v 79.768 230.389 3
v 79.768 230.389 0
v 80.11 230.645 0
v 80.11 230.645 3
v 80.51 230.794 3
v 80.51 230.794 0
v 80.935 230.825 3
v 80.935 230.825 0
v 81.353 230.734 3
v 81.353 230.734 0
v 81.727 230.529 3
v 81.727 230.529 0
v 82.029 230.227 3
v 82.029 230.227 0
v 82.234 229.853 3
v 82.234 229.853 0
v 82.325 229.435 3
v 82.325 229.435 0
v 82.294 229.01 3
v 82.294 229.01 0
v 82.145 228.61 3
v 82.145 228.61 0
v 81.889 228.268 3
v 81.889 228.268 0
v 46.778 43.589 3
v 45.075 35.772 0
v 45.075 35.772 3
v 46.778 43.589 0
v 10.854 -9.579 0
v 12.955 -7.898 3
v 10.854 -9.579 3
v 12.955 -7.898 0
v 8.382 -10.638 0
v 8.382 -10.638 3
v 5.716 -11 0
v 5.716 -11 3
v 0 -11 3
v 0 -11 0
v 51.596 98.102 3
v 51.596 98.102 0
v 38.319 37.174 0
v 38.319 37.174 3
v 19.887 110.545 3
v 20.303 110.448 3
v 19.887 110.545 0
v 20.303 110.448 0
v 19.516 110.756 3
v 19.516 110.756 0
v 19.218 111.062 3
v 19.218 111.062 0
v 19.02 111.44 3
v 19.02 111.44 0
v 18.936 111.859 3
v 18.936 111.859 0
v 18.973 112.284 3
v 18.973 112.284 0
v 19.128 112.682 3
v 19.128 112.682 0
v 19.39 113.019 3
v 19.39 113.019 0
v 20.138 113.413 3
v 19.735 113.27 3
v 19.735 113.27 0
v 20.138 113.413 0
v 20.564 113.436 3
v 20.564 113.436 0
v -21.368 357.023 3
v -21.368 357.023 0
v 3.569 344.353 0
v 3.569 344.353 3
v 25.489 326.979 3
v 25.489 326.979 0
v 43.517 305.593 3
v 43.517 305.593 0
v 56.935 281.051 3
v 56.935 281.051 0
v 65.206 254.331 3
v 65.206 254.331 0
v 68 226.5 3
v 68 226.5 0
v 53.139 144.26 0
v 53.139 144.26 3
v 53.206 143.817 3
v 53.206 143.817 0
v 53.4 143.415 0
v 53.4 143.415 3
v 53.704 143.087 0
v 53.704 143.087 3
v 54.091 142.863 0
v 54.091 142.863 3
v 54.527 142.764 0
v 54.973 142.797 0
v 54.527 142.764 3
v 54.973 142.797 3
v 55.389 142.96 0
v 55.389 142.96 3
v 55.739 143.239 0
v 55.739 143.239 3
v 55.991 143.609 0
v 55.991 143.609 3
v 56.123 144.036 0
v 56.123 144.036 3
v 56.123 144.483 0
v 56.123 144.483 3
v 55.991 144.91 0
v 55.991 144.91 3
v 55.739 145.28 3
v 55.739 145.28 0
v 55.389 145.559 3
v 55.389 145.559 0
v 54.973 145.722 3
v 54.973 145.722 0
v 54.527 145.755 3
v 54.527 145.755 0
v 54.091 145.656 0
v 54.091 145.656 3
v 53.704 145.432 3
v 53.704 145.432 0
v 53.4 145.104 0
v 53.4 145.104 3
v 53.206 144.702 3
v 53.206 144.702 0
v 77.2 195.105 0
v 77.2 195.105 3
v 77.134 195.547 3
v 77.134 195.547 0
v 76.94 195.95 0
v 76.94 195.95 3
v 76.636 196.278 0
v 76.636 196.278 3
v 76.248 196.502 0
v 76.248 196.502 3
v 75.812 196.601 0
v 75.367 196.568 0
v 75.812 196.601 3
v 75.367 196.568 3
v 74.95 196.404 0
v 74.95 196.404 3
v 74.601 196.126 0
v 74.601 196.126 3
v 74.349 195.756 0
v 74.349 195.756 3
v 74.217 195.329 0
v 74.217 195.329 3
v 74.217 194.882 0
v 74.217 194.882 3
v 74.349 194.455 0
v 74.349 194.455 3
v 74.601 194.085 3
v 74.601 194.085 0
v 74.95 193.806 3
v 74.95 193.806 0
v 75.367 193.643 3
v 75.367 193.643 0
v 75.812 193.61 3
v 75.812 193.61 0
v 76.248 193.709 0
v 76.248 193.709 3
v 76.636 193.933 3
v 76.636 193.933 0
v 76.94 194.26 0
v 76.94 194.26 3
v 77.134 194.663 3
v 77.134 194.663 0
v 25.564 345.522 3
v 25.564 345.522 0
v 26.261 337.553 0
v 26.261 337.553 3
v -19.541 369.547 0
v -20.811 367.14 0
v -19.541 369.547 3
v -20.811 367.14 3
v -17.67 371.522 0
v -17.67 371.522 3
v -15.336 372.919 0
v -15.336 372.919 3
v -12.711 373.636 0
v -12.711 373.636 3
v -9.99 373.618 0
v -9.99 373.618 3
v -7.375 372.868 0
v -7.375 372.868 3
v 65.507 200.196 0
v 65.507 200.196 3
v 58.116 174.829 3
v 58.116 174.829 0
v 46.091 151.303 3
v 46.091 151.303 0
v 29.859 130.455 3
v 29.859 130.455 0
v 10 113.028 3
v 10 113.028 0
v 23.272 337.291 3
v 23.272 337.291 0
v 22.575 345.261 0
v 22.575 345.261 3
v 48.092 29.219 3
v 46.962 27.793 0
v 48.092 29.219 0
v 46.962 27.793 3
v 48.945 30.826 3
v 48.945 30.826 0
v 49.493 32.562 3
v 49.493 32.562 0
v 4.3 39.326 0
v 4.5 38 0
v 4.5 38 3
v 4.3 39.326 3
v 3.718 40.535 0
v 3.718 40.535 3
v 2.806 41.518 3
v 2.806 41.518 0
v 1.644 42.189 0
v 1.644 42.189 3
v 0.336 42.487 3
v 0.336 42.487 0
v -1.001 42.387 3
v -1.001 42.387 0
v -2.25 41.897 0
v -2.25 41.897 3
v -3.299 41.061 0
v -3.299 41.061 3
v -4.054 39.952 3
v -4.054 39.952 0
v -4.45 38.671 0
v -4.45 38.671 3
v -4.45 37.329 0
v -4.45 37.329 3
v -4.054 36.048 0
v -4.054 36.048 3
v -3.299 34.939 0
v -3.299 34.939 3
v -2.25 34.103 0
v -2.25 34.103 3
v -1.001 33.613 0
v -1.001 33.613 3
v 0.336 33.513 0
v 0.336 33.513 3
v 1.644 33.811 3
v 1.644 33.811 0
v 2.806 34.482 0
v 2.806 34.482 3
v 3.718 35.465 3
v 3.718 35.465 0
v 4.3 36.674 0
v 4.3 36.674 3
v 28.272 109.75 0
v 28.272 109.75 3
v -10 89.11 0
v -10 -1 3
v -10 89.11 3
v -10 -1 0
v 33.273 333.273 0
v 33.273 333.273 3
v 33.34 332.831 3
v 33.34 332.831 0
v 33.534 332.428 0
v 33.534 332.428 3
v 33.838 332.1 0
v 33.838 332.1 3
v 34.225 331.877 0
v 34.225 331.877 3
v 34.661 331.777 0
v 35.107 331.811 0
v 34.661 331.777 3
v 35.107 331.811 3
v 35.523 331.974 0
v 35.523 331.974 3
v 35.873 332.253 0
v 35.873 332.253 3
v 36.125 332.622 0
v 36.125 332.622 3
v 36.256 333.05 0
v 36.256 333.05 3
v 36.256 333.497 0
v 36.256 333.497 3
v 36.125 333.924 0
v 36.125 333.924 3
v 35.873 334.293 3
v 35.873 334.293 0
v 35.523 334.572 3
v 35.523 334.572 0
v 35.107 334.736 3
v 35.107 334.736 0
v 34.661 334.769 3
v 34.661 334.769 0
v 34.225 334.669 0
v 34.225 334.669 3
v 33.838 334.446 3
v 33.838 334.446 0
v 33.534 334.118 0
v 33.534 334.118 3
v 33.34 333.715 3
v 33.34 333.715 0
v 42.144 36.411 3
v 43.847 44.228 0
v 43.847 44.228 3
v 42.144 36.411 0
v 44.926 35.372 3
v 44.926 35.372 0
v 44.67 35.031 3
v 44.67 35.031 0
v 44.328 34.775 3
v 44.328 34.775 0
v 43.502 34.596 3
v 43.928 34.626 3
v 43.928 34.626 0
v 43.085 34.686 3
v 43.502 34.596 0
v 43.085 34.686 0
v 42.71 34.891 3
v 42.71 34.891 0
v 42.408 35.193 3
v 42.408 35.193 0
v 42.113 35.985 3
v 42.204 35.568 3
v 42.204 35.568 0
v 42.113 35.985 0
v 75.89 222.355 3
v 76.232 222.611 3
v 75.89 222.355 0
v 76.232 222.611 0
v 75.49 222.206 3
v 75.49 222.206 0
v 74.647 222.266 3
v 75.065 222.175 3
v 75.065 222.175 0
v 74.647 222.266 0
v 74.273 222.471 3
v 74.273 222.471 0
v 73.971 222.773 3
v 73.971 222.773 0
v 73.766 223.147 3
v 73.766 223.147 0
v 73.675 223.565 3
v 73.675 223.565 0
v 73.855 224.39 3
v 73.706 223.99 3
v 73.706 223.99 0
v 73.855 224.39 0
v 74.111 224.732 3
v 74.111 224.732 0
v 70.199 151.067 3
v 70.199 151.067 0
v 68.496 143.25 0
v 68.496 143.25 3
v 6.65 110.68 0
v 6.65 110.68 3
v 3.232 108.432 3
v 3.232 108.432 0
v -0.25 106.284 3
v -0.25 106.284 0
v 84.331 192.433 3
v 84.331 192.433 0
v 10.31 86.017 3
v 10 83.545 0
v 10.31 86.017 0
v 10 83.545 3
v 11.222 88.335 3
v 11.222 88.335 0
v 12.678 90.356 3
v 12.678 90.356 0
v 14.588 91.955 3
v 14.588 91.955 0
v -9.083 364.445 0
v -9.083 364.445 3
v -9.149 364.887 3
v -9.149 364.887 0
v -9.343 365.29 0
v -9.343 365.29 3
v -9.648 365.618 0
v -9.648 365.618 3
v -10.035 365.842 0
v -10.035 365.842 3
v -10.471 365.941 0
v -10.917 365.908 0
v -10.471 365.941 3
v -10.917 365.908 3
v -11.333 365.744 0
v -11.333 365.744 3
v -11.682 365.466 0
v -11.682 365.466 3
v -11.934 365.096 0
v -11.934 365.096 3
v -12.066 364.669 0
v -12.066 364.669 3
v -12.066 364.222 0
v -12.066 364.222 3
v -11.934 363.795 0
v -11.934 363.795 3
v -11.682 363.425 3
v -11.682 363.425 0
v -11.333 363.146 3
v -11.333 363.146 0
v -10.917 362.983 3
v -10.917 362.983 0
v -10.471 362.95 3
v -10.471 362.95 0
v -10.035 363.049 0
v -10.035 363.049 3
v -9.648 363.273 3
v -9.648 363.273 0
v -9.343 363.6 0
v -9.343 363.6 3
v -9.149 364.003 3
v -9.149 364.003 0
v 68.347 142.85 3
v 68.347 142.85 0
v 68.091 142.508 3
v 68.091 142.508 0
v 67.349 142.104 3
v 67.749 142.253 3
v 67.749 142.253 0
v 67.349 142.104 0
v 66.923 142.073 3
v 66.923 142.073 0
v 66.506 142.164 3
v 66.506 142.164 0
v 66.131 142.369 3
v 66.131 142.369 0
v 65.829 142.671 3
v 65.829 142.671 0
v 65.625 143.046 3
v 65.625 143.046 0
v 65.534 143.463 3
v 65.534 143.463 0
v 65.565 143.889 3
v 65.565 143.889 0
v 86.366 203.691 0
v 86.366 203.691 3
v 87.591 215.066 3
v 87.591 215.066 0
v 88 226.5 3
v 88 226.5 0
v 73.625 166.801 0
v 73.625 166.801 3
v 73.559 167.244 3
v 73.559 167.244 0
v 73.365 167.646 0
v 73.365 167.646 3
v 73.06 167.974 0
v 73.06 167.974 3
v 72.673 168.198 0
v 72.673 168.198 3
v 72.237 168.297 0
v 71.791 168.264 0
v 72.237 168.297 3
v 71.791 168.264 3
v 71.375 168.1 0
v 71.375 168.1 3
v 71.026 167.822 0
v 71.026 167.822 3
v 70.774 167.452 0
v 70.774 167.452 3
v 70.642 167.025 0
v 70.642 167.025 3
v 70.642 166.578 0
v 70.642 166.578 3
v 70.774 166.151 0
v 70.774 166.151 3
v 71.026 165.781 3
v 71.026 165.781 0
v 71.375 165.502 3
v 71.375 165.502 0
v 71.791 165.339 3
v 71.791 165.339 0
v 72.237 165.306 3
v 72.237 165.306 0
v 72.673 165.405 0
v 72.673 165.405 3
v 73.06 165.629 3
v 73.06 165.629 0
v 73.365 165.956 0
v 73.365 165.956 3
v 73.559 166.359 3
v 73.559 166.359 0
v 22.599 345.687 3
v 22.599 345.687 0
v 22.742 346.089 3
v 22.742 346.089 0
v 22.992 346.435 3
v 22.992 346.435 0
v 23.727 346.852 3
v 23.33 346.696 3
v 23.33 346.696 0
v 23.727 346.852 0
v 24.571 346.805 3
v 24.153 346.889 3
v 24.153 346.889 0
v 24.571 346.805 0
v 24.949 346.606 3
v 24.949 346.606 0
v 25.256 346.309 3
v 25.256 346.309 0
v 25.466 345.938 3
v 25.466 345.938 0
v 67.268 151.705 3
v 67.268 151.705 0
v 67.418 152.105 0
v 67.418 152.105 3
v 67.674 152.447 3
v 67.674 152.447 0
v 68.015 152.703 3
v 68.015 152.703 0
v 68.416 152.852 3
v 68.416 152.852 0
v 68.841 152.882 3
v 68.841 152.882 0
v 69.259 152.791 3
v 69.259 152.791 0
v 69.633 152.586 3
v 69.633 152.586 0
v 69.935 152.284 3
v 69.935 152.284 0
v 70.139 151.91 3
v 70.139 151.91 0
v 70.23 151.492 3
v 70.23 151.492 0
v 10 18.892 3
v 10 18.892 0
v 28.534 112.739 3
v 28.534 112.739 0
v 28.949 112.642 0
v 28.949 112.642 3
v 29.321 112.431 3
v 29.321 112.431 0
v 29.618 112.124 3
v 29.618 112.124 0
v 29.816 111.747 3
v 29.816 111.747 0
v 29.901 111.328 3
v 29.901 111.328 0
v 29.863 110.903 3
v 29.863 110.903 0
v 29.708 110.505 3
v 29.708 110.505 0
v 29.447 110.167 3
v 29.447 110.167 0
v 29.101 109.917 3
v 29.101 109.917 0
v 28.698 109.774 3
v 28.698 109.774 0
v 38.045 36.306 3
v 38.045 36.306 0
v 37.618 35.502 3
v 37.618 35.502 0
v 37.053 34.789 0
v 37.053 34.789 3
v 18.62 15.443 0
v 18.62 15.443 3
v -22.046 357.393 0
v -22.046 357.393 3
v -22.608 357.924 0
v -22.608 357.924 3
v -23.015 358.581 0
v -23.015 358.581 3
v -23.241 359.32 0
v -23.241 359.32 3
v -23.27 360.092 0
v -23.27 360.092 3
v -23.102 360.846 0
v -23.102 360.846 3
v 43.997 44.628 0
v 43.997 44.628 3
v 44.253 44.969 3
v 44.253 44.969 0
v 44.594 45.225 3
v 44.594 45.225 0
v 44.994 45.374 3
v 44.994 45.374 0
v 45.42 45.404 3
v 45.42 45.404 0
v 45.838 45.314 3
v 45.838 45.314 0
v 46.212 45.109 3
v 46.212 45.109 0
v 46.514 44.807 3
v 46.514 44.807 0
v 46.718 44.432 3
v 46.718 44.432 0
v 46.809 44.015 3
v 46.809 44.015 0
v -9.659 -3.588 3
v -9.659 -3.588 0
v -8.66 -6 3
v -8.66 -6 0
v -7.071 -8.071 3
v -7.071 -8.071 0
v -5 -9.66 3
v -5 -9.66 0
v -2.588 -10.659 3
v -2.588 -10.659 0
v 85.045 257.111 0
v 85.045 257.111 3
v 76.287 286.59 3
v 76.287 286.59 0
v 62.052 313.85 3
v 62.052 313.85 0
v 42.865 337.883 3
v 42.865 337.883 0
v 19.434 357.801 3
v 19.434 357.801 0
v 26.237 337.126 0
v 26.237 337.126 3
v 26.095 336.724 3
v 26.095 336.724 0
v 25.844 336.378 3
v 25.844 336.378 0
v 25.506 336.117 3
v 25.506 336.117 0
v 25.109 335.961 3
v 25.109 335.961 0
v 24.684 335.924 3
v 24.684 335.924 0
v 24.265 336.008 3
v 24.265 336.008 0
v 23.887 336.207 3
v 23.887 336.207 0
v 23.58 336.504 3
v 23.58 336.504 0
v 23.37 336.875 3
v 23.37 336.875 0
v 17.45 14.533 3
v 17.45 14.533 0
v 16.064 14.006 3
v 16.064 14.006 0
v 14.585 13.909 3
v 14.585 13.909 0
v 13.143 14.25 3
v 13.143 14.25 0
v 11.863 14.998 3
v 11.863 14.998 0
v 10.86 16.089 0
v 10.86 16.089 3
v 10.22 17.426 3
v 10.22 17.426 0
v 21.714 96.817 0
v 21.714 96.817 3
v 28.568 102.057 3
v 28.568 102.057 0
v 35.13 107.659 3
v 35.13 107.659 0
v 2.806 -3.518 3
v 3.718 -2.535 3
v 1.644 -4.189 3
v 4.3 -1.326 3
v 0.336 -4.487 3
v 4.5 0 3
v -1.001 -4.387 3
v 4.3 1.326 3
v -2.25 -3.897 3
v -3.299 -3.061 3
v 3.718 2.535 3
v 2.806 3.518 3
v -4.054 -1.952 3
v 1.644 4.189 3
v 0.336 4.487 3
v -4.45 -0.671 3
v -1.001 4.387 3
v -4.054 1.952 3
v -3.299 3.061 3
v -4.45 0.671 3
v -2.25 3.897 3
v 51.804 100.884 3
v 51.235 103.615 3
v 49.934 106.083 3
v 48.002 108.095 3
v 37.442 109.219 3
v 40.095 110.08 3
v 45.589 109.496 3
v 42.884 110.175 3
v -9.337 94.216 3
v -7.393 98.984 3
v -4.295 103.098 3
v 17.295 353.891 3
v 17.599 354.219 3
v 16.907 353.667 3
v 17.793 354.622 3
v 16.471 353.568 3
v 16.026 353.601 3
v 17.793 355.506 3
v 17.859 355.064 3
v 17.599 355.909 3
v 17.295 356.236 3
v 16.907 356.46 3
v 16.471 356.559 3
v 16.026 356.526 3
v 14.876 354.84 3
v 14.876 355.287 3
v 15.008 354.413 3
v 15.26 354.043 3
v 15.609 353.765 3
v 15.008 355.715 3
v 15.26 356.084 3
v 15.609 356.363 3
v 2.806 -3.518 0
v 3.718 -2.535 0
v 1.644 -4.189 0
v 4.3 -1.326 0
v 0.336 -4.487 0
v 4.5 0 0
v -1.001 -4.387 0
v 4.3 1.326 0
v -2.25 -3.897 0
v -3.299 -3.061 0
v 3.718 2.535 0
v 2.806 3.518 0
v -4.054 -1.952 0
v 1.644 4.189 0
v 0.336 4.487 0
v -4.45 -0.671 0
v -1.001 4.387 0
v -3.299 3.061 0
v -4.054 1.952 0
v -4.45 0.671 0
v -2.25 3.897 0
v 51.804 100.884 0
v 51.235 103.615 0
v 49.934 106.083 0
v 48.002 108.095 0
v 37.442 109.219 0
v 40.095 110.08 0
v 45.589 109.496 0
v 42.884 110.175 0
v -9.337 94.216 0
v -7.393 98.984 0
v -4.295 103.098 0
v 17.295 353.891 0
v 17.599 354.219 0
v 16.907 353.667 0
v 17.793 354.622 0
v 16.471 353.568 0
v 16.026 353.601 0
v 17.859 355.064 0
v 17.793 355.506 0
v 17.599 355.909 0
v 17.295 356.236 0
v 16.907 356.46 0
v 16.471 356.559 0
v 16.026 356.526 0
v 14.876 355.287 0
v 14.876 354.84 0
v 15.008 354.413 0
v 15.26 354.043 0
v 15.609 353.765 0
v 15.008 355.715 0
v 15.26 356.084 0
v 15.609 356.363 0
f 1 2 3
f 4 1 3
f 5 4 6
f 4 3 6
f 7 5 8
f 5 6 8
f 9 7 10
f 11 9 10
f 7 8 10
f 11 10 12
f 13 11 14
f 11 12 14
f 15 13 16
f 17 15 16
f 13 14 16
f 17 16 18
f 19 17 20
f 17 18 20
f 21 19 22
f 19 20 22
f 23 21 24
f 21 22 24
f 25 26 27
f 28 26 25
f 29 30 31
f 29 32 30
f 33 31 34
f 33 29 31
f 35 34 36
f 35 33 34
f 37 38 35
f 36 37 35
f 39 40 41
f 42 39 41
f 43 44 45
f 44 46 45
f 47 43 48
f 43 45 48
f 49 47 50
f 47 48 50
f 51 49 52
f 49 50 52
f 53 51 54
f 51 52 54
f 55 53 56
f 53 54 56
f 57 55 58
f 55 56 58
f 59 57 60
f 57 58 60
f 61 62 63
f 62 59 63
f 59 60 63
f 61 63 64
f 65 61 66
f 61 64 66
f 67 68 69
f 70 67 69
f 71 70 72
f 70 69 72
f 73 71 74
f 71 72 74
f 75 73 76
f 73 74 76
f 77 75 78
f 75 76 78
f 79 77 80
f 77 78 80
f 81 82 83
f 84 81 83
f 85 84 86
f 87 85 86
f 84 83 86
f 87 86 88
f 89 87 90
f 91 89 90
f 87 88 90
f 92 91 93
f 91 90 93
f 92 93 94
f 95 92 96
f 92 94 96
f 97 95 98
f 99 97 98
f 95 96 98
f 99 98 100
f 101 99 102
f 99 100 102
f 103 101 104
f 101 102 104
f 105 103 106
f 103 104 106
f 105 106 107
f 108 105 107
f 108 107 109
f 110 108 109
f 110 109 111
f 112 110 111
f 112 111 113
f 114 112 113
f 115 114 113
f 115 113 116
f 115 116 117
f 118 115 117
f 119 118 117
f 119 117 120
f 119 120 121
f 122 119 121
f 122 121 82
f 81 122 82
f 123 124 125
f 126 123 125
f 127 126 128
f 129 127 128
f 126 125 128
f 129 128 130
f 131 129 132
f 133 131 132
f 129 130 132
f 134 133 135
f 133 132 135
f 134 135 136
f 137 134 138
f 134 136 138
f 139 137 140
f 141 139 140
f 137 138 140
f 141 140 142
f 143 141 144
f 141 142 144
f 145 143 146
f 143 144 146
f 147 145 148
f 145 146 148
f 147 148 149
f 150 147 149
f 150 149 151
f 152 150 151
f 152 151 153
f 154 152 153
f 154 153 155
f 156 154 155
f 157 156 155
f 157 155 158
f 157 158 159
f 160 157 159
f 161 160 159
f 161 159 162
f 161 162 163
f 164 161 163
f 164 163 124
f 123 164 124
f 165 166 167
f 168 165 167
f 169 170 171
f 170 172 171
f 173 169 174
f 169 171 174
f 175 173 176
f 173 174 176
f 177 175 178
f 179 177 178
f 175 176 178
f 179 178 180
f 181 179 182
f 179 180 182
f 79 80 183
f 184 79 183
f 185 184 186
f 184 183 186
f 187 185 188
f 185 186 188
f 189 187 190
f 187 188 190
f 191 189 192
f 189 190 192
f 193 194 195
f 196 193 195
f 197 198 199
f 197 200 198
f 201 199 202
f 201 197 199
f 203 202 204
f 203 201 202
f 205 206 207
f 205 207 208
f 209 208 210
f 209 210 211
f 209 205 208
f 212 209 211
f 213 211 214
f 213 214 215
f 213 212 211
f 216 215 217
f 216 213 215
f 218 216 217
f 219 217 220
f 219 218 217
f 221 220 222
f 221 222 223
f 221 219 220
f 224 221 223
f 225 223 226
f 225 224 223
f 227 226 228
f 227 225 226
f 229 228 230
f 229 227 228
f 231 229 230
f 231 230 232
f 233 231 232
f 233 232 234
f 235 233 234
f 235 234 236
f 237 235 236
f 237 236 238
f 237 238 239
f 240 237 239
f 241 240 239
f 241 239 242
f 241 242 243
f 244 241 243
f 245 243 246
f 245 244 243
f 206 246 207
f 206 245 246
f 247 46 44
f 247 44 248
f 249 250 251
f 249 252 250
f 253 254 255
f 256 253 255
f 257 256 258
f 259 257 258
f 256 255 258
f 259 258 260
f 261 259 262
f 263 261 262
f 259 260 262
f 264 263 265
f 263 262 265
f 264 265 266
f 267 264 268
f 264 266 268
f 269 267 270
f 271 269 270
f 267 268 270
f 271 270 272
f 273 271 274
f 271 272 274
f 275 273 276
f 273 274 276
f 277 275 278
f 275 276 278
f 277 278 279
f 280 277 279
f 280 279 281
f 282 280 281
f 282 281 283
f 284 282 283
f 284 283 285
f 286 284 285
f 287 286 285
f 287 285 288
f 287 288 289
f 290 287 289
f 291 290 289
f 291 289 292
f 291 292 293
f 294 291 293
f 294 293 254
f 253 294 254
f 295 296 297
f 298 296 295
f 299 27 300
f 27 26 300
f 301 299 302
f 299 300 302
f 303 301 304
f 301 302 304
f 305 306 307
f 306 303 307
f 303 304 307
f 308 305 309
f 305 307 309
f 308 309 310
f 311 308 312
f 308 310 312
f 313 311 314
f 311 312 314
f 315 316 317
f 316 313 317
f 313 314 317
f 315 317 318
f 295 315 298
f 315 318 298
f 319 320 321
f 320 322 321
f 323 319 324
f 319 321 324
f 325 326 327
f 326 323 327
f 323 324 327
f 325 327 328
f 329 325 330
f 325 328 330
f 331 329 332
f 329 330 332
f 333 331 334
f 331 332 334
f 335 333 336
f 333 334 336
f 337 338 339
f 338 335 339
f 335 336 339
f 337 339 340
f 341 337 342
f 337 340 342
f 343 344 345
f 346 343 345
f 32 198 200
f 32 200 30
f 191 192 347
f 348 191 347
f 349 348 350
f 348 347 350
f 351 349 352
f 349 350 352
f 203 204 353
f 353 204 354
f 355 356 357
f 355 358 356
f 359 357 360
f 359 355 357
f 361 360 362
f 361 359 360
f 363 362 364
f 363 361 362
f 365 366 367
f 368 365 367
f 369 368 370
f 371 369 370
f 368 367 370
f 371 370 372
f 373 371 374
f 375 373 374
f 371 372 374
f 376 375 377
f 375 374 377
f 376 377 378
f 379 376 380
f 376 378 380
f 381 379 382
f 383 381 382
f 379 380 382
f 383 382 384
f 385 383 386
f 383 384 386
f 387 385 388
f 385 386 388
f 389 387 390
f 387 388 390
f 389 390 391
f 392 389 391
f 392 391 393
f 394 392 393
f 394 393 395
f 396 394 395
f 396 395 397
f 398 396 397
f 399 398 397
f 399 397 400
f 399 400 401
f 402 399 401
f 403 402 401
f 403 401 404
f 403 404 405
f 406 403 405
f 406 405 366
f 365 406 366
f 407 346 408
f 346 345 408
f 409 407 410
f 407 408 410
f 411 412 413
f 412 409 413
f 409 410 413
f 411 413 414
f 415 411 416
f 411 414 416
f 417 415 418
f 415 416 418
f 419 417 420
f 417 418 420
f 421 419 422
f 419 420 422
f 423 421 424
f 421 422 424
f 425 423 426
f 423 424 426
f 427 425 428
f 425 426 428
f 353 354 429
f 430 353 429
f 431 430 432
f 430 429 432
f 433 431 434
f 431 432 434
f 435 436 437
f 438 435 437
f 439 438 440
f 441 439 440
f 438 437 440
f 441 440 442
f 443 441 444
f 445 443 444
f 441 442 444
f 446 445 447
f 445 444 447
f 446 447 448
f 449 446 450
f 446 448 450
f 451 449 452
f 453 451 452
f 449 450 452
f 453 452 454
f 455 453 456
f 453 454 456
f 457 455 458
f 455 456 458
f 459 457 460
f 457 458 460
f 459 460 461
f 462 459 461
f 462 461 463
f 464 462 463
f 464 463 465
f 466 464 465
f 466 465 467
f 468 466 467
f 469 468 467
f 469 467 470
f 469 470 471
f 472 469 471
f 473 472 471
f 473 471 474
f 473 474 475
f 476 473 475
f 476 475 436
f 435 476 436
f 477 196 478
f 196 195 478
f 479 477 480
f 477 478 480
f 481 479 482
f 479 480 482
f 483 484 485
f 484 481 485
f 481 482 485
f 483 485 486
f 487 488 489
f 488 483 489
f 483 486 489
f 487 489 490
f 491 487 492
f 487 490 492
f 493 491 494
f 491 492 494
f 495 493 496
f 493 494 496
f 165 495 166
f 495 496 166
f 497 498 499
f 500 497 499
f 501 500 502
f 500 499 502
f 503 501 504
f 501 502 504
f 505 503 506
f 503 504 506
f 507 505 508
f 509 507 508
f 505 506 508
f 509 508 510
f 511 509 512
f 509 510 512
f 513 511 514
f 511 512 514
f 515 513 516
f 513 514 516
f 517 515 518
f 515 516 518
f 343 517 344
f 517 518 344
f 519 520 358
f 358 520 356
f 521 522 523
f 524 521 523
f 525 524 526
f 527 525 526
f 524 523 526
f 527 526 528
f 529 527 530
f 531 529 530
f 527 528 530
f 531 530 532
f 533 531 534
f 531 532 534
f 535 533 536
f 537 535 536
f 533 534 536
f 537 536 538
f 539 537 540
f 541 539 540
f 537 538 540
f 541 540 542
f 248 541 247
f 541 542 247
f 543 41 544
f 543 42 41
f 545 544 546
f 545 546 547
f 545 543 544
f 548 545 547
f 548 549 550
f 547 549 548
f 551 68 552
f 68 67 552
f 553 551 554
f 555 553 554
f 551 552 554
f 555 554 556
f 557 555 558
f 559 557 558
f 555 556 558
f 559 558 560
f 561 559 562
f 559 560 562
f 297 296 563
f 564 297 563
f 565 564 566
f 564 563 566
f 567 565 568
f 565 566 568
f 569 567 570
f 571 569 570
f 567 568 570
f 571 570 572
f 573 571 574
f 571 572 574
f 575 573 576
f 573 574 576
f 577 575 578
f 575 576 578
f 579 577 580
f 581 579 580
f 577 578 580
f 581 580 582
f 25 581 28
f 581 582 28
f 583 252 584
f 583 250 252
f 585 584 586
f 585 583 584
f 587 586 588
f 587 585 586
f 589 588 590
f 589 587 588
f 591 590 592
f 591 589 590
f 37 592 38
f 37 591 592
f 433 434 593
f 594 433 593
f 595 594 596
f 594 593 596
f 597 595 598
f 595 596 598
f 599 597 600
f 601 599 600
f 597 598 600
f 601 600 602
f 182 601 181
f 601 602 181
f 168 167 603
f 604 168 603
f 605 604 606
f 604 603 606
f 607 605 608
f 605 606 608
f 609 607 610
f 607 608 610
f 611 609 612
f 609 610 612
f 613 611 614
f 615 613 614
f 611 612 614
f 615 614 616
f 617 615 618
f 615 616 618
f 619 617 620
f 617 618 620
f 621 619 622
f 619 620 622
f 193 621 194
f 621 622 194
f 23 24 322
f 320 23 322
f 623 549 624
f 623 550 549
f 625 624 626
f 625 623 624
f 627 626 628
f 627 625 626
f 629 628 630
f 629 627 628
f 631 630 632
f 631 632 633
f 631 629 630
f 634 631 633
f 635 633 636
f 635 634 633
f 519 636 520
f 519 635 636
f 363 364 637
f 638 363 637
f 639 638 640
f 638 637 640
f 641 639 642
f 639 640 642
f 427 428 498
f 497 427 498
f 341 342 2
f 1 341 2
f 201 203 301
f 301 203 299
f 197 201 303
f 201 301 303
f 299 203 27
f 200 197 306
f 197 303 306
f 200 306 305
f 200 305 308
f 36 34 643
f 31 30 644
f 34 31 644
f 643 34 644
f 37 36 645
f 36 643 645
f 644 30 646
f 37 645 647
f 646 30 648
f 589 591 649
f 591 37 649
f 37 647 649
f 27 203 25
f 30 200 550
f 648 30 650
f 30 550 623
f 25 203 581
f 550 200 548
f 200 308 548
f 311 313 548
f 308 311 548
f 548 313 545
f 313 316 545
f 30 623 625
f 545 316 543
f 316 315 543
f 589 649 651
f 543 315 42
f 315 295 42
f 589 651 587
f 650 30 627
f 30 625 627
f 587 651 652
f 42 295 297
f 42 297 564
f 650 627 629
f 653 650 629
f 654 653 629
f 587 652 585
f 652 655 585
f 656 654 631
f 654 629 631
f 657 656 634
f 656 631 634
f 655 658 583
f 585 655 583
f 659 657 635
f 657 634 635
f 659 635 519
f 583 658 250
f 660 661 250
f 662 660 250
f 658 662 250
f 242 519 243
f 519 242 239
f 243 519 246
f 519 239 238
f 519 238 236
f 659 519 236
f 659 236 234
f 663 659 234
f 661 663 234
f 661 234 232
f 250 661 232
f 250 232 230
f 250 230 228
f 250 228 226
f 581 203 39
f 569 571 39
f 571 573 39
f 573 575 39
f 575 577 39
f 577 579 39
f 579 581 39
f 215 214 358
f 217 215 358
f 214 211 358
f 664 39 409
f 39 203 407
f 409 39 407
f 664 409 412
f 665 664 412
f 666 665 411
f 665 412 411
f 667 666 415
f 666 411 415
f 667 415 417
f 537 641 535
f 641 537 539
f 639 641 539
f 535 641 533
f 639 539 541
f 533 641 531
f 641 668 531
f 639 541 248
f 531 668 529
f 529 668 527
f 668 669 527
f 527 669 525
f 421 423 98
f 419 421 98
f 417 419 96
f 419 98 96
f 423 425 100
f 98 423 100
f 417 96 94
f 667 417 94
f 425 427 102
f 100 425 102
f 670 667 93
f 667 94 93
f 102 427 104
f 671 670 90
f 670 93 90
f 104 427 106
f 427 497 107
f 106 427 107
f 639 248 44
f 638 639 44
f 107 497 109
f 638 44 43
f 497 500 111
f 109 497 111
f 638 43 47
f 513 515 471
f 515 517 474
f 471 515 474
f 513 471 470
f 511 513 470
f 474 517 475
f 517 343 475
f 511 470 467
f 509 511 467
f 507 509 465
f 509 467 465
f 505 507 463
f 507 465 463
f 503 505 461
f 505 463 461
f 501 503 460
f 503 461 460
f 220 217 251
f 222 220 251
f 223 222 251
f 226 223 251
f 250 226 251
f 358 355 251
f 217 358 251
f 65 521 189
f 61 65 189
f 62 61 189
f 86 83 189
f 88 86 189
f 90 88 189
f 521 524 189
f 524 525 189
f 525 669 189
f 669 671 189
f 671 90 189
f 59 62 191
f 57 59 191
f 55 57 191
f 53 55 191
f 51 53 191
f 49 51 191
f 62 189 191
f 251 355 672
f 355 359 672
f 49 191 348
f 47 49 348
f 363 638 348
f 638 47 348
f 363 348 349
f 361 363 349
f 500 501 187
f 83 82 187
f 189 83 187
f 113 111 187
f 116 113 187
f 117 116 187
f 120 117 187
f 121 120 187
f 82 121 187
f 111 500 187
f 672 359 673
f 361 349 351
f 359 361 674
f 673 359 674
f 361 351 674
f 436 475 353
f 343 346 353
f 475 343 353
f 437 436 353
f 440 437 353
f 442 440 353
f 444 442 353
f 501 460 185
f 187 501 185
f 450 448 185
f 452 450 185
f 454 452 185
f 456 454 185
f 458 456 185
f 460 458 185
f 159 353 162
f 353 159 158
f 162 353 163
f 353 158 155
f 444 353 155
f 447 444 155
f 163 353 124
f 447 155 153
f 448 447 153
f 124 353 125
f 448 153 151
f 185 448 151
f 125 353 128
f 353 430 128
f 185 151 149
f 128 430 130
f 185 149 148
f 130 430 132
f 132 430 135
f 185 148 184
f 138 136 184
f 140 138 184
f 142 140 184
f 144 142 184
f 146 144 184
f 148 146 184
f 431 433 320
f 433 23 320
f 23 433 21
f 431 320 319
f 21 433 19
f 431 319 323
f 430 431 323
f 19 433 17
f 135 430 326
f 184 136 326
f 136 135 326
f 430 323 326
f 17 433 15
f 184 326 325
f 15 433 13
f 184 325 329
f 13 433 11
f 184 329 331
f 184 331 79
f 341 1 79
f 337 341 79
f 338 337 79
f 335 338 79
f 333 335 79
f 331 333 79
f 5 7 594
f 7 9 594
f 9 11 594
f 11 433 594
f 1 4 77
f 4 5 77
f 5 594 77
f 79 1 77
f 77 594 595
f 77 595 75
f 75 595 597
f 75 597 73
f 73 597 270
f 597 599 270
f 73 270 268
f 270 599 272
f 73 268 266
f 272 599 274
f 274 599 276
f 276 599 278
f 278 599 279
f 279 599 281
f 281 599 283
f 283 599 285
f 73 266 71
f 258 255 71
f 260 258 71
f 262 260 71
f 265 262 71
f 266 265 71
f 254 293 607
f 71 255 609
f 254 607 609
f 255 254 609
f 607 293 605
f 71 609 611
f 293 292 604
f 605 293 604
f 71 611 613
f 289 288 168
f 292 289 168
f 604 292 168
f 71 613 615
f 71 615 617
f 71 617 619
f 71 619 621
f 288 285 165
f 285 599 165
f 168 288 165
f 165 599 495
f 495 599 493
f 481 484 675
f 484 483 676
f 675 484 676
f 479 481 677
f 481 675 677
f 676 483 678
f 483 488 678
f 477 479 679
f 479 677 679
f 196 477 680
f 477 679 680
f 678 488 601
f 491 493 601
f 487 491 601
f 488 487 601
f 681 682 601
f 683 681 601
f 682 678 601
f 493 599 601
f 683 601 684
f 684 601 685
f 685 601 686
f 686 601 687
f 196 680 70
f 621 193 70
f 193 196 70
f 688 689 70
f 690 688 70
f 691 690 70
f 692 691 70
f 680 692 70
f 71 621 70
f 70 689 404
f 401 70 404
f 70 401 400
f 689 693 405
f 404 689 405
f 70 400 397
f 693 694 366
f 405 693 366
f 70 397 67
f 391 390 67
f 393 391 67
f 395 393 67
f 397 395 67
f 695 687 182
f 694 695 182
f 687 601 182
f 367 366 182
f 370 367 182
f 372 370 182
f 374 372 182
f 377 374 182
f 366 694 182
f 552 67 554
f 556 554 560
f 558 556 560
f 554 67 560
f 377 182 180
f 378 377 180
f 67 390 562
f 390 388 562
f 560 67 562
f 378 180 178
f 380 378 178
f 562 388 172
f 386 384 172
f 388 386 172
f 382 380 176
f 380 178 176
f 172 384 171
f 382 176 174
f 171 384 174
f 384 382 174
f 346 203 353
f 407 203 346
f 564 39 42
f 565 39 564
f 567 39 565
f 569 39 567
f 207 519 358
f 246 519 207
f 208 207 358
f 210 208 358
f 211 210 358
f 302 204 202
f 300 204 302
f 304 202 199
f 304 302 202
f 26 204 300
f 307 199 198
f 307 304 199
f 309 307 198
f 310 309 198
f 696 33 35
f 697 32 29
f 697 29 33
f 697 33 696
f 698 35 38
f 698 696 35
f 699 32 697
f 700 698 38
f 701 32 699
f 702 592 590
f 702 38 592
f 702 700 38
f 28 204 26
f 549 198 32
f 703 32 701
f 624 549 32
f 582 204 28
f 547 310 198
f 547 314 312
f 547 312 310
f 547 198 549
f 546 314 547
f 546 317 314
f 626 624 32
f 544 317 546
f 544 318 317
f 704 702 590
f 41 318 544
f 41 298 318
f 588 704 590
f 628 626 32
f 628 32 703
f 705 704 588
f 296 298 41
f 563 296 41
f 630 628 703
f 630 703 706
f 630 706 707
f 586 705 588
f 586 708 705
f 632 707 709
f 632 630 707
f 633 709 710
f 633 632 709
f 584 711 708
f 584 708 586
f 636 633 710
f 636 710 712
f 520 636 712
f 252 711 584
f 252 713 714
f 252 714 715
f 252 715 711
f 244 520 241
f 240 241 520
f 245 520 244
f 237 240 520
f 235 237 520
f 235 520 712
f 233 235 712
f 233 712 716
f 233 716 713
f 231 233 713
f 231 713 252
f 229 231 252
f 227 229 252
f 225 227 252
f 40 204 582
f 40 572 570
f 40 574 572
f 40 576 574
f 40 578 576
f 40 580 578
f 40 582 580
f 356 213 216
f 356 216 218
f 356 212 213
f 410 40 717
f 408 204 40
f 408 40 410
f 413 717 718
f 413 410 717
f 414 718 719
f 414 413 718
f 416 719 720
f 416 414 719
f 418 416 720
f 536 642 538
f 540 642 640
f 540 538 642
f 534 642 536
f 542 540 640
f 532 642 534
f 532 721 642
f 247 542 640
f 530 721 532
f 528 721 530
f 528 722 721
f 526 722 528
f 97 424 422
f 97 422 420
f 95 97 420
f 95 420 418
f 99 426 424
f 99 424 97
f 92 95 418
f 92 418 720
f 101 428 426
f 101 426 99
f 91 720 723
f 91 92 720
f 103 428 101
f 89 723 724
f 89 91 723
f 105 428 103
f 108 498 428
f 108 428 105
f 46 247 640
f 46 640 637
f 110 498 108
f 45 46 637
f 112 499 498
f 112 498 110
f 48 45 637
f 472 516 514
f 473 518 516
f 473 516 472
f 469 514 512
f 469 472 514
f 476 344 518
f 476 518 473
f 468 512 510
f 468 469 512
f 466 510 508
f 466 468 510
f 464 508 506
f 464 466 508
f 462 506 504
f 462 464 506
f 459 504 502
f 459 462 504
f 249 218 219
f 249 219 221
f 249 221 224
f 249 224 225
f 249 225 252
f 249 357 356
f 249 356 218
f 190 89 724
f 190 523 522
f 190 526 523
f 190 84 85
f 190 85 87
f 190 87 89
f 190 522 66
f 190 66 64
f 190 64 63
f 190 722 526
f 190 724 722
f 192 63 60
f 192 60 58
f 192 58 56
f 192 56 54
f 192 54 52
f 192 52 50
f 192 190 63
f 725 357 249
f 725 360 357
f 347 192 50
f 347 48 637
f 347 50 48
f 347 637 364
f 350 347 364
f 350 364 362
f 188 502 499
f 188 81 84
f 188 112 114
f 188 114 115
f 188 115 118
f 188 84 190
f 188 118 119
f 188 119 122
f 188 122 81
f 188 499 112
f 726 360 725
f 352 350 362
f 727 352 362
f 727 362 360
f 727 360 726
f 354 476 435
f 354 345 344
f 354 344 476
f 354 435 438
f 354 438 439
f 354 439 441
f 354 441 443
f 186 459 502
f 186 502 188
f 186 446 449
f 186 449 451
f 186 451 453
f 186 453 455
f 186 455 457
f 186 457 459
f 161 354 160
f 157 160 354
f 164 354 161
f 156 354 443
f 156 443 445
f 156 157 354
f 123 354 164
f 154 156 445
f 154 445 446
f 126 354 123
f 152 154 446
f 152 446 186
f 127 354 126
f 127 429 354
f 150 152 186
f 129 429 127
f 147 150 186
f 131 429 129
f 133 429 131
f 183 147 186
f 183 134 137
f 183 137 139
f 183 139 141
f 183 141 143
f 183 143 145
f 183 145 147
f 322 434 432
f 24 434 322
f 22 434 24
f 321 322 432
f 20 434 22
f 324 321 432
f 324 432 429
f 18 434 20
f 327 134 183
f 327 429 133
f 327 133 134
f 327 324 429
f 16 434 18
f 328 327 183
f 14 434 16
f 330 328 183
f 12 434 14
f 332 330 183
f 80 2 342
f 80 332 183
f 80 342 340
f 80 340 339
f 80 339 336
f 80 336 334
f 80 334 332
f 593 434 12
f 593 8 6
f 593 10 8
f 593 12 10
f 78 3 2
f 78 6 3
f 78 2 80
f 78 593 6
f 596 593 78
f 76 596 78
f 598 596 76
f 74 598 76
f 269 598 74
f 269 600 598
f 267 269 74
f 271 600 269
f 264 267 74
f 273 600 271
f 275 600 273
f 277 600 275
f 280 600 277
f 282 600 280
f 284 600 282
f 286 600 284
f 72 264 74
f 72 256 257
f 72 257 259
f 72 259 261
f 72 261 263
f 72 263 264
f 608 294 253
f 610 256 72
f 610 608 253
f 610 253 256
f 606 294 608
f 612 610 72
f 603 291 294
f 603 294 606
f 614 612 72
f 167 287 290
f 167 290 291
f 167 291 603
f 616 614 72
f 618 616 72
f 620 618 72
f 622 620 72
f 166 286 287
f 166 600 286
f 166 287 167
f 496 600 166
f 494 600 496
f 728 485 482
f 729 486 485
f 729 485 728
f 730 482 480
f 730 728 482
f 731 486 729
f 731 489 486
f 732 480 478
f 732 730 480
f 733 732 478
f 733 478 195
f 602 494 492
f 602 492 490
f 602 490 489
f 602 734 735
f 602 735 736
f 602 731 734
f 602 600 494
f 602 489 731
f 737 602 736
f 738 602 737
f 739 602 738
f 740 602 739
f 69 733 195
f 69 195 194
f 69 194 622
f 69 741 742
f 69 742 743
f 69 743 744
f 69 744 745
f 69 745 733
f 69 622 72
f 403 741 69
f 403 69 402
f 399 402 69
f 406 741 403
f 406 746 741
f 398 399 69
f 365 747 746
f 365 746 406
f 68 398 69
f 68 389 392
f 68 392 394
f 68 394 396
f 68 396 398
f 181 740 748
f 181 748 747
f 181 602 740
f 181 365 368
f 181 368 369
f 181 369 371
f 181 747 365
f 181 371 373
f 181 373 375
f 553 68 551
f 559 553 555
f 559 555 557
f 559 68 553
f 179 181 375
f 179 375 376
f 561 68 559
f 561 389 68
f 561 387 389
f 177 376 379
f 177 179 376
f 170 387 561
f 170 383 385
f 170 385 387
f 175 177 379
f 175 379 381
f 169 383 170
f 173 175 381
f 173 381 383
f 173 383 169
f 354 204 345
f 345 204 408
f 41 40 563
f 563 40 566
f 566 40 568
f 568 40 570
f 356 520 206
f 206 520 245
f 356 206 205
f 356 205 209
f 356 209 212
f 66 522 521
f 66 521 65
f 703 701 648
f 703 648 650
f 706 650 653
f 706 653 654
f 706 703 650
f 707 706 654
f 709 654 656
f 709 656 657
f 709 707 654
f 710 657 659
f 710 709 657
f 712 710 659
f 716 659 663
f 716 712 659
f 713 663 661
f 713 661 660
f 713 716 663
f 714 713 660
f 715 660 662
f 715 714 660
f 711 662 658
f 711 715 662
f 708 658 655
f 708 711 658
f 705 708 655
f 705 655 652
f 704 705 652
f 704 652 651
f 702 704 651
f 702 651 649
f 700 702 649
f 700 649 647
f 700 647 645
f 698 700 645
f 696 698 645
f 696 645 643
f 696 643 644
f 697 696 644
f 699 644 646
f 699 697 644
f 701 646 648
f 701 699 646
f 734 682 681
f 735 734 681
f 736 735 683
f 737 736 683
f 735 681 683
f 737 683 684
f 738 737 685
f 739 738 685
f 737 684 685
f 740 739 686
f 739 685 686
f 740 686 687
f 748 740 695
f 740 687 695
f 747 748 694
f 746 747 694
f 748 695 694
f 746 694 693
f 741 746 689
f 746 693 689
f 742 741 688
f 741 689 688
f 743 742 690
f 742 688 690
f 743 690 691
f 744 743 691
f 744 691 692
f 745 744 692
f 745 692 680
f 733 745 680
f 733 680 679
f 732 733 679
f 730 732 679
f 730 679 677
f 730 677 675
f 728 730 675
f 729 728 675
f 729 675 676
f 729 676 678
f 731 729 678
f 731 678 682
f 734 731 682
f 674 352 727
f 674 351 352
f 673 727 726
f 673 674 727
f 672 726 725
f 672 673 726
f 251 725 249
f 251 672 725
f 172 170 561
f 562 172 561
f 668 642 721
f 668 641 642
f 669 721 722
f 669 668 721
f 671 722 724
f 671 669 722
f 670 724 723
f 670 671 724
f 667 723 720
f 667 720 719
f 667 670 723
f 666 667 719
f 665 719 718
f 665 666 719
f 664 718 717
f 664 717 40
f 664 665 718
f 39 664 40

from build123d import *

# Parameters (mm, degrees)
SKETCH_1_W          = 20
SKETCH_1_H          = 60
SKETCH_1_R          = 4.5
EXTRUDE_1_DEPTH     = 3
EXTRUDE_START       = -3
EXTRUDE_2_DEPTH     = 3
FILLET_2_R          = 20
FILLET_3_R          = 10
FILLET_4_R          = 3
FILLET_5_R          = 10
CUT_EXTRUDE_1_DEPTH = 384.952760264
CUT_EXTRUDE_2_DEPTH = 384.952760264
SKETCH_5_R          = 1.5
CUT_EXTRUDE_3_DEPTH = 384.952760264
CUT_EXTRUDE_4_DEPTH = 384.952760264
EXTRUDE_3_DEPTH     = 3
FILLET_6_R          = 10
FILLET_7_R          = 5
SKETCH_8_R          = 1.5
CUT_EXTRUDE_5_DEPTH = 384.952760264


with BuildPart() as part:
    # 草图1 → 凸台-拉伸1 (new body)
    # profile 1 of 4: a face of its own
    with BuildSketch(Plane.XY):
        with BuildLine():
            ThreePointArc((88, 226.5), (59.064327086, 318.272229816), (-17.276777068, 376.850819326))
            Line((-17.276777068, 376.850819326), (-24.117179934, 358.05696691))
            ThreePointArc((-24.117179934, 358.05696691), (42.6812862, 306.800701089), (68, 226.5))
            ThreePointArc((68, 226.5), (52.659536338, 162.781870712), (10, 113.02753638))
            Line((10, 113.02753638), (10, 89.110044035))
            ThreePointArc((10, 89.110044035), (67.140217047, 147.506329367), (88, 226.5))
        make_face()
    # profile 2 of 4: a face of its own
    with BuildSketch(Plane.XY):
        with BuildLine():
            Line((-10, 100.977093724), (-10, 79.00084746))
            ThreePointArc((-10, 79.00084746), (0.177205293, 83.704863402), (10, 89.110044035))
            Line((10, 89.110044035), (10, 113.02753638))
            ThreePointArc((10, 113.02753638), (0.251666362, 106.584626891), (-10, 100.977093724))
        make_face()
    # profile 3 of 4: a face of its own
    with BuildSketch(Plane.XY):
        with BuildLine():
            Line((-10, 79.00084746), (-10, 49))
            Line((-10, 49), (10, 49))
            Line((10, 49), (10, 89.110044035))
            ThreePointArc((10, 89.110044035), (0.177205293, 83.704863402), (-10, 79.00084746))
        make_face()
    # profile 4 of 4: a face of its own
    with BuildSketch(Plane.XY):
        with Locations((0, 19)):
            Rectangle(SKETCH_1_W, SKETCH_1_H)
        with Locations((0, 38)):
            Circle(SKETCH_1_R, mode=Mode.SUBTRACT)
        Circle(SKETCH_1_R, mode=Mode.SUBTRACT)
    extrude(amount=EXTRUDE_1_DEPTH)

    # 草图2 → 凸台-拉伸2 (add)
    with BuildSketch(Plane.XY.offset(3).offset(EXTRUDE_START)):
        with BuildLine():
            Line((10, -1), (10, -11))
            Line((10, -11), (40, -11))
            Line((40, -11), (84.331190721, 192.433024677))
            ThreePointArc((84.331190721, 192.433024677), (74.827433124, 162.925595698), (59.811855282, 135.804714527))
            Line((59.811855282, 135.804714527), (30, -1))
            Line((30, -1), (10, -1))
        make_face()
    extrude(amount=EXTRUDE_2_DEPTH)

    # 圆角2
    fillet_2_edges = [part.edges().sort_by_distance(p)[0] for p in [
        (-10, 100.977093724, 1.5),
    ]]
    fillet(fillet_2_edges, radius=FILLET_2_R)

    # 圆角3
    fillet_3_edges = [part.edges().sort_by_distance(p)[0] for p in [
        (-10, -11, 1.5),
        (40, -11, 1.5),
    ]]
    fillet(fillet_3_edges, radius=FILLET_3_R)

    # 圆角4
    fillet_4_edges = [part.edges().sort_by_distance(p)[0] for p in [
        (-24.117179934, 358.05696691, 1.5),
    ]]
    fillet(fillet_4_edges, radius=FILLET_4_R)

    # 圆角5
    fillet_5_edges = [part.edges().sort_by_distance(p)[0] for p in [
        (-17.276777068, 376.850819326, 1.5),
    ]]
    fillet(fillet_5_edges, radius=FILLET_5_R)

    # 草图3 → 切除-拉伸1 (cut, through all)
    with BuildSketch(Plane(origin=(0, 0, 0), x_dir=(-1, 0, 0), z_dir=(0, 0, -1))):
        Polygon((-46.77842194, 43.588901874), (-43.847212114, 44.227657662), (-42.143863348, 36.411098126), (-45.075073174, 35.772342338), align=None)
        Polygon((-70.199467474, 151.066595495), (-68.496118708, 143.250035959), (-65.564908882, 143.888791747), (-67.268257648, 151.705351283), align=None)
    extrude(amount=-CUT_EXTRUDE_1_DEPTH, mode=Mode.SUBTRACT)

    # 草图4 → 切除-拉伸2 (cut, through all)
    with BuildSketch(Plane(origin=(0, 0, 0), x_dir=(-1, 0, 0), z_dir=(0, 0, -1))):
        Polygon((-28.272186631, 109.750418514), (-28.533653859, 112.739002608), (-20.564096275, 113.43624855), (-20.302629046, 110.447664456), align=None)
        Polygon((-81.889087297, 228.267766953), (-76.232233047, 222.610912703), (-74.110912703, 224.732233047), (-79.767766953, 230.389087297), align=None)
        Polygon((-25.563810529, 345.522178874), (-26.261056471, 337.55262129), (-23.272472377, 337.291154061), (-22.575226435, 345.260711646), align=None)
        Polygon((100.463470173, 377.744196764), (93.910253818, 373.155585273), (95.630983127, 370.69812914), (102.184199482, 375.286740631), align=None)
    extrude(amount=-CUT_EXTRUDE_2_DEPTH, mode=Mode.SUBTRACT)

    # 草图5 → 切除-拉伸3 (cut, through all)
    with BuildSketch(Plane.XY.offset(3)):
        with Locations((72.125207072, 166.801384551)):
            Circle(SKETCH_5_R)
        with Locations((75.700287711, 195.105334687)):
            Circle(SKETCH_5_R)
        with Locations(Location((54.63925576, 144.259505713, 0), (0, 0, 180))):
            Circle(SKETCH_5_R)
        with Locations(Location((34.773123959, 333.273123959, 0), (0, 0, 180))):
            Circle(SKETCH_5_R)
        with Locations((16.35937296, 355.063685425)):
            Circle(SKETCH_5_R)
        with Locations((-10.582766896, 364.445364104)):
            Circle(SKETCH_5_R)
    extrude(amount=-CUT_EXTRUDE_3_DEPTH, mode=Mode.SUBTRACT)

    # 草图6 → 切除-拉伸4 (cut, through all)
    with BuildSketch(Plane(origin=(0, 0, 0), x_dir=(-1, 0, 0), z_dir=(0, 0, -1))):
        Polygon((-48.895829905, 29.822399649), (-37.268809589, 32.356106534), (-10, -1), (-10, -25.455905849), (-44.544329985, -23.840605691), align=None)
    extrude(amount=-CUT_EXTRUDE_4_DEPTH, mode=Mode.SUBTRACT)

    # 草图7 → 凸台-拉伸3 (add)
    with BuildSketch(Plane(origin=(0, 0, 0), x_dir=(-1, 0, 0), z_dir=(0, 0, -1))):
        Polygon((-48.895829905, 29.822399649), (-10, -11), (-10, 6.39592954), (-38.020150061, 35.803960345), (-37.268809589, 32.356106534), align=None)
    extrude(amount=-EXTRUDE_3_DEPTH)

    # 圆角6
    fillet_6_edges = [part.edges().sort_by_distance(p)[0] for p in [
        (10, 89.110044035, 1.5),
        (10, -11, 1.5),
        (48.895829905, 29.822399649, 1.5),
        (59.811855282, 135.804714527, 1.5),
    ]]
    fillet(fillet_6_edges, radius=FILLET_6_R)

    # 圆角7
    fillet_7_edges = [part.edges().sort_by_distance(p)[0] for p in [
        (38.020150061, 35.803960345, 1.5),
        (10, 6.39592954, 1.5),
    ]]
    fillet(fillet_7_edges, radius=FILLET_7_R)

    # 草图8 → 切除-拉伸5 (cut, through all)
    with BuildSketch(Plane(origin=(0, 0, 0), x_dir=(-1, 0, 0), z_dir=(0, 0, -1))):
        with Locations((-43.609468261, 36.091720232)):
            Circle(SKETCH_8_R)
        with Locations((-45.312817027, 43.908279768)):
            Circle(SKETCH_8_R)
        with Locations((-67.030513795, 143.569413853)):
            Circle(SKETCH_8_R)
        with Locations((-68.733862561, 151.385973389)):
            Circle(SKETCH_8_R)
        with Locations((-28.402920245, 111.244710561)):
            Circle(SKETCH_8_R)
        with Locations((-20.433362661, 111.941956503)):
            Circle(SKETCH_8_R)
        with Locations((-75.171572875, 223.671572875)):
            Circle(SKETCH_8_R)
        with Locations((-80.828427125, 229.328427125)):
            Circle(SKETCH_8_R)
        with Locations((-24.766764424, 337.421887675)):
            Circle(SKETCH_8_R)
        with Locations((-24.069518482, 345.39144526)):
            Circle(SKETCH_8_R)
    extrude(amount=-CUT_EXTRUDE_5_DEPTH, mode=Mode.SUBTRACT)


solid = part.part
